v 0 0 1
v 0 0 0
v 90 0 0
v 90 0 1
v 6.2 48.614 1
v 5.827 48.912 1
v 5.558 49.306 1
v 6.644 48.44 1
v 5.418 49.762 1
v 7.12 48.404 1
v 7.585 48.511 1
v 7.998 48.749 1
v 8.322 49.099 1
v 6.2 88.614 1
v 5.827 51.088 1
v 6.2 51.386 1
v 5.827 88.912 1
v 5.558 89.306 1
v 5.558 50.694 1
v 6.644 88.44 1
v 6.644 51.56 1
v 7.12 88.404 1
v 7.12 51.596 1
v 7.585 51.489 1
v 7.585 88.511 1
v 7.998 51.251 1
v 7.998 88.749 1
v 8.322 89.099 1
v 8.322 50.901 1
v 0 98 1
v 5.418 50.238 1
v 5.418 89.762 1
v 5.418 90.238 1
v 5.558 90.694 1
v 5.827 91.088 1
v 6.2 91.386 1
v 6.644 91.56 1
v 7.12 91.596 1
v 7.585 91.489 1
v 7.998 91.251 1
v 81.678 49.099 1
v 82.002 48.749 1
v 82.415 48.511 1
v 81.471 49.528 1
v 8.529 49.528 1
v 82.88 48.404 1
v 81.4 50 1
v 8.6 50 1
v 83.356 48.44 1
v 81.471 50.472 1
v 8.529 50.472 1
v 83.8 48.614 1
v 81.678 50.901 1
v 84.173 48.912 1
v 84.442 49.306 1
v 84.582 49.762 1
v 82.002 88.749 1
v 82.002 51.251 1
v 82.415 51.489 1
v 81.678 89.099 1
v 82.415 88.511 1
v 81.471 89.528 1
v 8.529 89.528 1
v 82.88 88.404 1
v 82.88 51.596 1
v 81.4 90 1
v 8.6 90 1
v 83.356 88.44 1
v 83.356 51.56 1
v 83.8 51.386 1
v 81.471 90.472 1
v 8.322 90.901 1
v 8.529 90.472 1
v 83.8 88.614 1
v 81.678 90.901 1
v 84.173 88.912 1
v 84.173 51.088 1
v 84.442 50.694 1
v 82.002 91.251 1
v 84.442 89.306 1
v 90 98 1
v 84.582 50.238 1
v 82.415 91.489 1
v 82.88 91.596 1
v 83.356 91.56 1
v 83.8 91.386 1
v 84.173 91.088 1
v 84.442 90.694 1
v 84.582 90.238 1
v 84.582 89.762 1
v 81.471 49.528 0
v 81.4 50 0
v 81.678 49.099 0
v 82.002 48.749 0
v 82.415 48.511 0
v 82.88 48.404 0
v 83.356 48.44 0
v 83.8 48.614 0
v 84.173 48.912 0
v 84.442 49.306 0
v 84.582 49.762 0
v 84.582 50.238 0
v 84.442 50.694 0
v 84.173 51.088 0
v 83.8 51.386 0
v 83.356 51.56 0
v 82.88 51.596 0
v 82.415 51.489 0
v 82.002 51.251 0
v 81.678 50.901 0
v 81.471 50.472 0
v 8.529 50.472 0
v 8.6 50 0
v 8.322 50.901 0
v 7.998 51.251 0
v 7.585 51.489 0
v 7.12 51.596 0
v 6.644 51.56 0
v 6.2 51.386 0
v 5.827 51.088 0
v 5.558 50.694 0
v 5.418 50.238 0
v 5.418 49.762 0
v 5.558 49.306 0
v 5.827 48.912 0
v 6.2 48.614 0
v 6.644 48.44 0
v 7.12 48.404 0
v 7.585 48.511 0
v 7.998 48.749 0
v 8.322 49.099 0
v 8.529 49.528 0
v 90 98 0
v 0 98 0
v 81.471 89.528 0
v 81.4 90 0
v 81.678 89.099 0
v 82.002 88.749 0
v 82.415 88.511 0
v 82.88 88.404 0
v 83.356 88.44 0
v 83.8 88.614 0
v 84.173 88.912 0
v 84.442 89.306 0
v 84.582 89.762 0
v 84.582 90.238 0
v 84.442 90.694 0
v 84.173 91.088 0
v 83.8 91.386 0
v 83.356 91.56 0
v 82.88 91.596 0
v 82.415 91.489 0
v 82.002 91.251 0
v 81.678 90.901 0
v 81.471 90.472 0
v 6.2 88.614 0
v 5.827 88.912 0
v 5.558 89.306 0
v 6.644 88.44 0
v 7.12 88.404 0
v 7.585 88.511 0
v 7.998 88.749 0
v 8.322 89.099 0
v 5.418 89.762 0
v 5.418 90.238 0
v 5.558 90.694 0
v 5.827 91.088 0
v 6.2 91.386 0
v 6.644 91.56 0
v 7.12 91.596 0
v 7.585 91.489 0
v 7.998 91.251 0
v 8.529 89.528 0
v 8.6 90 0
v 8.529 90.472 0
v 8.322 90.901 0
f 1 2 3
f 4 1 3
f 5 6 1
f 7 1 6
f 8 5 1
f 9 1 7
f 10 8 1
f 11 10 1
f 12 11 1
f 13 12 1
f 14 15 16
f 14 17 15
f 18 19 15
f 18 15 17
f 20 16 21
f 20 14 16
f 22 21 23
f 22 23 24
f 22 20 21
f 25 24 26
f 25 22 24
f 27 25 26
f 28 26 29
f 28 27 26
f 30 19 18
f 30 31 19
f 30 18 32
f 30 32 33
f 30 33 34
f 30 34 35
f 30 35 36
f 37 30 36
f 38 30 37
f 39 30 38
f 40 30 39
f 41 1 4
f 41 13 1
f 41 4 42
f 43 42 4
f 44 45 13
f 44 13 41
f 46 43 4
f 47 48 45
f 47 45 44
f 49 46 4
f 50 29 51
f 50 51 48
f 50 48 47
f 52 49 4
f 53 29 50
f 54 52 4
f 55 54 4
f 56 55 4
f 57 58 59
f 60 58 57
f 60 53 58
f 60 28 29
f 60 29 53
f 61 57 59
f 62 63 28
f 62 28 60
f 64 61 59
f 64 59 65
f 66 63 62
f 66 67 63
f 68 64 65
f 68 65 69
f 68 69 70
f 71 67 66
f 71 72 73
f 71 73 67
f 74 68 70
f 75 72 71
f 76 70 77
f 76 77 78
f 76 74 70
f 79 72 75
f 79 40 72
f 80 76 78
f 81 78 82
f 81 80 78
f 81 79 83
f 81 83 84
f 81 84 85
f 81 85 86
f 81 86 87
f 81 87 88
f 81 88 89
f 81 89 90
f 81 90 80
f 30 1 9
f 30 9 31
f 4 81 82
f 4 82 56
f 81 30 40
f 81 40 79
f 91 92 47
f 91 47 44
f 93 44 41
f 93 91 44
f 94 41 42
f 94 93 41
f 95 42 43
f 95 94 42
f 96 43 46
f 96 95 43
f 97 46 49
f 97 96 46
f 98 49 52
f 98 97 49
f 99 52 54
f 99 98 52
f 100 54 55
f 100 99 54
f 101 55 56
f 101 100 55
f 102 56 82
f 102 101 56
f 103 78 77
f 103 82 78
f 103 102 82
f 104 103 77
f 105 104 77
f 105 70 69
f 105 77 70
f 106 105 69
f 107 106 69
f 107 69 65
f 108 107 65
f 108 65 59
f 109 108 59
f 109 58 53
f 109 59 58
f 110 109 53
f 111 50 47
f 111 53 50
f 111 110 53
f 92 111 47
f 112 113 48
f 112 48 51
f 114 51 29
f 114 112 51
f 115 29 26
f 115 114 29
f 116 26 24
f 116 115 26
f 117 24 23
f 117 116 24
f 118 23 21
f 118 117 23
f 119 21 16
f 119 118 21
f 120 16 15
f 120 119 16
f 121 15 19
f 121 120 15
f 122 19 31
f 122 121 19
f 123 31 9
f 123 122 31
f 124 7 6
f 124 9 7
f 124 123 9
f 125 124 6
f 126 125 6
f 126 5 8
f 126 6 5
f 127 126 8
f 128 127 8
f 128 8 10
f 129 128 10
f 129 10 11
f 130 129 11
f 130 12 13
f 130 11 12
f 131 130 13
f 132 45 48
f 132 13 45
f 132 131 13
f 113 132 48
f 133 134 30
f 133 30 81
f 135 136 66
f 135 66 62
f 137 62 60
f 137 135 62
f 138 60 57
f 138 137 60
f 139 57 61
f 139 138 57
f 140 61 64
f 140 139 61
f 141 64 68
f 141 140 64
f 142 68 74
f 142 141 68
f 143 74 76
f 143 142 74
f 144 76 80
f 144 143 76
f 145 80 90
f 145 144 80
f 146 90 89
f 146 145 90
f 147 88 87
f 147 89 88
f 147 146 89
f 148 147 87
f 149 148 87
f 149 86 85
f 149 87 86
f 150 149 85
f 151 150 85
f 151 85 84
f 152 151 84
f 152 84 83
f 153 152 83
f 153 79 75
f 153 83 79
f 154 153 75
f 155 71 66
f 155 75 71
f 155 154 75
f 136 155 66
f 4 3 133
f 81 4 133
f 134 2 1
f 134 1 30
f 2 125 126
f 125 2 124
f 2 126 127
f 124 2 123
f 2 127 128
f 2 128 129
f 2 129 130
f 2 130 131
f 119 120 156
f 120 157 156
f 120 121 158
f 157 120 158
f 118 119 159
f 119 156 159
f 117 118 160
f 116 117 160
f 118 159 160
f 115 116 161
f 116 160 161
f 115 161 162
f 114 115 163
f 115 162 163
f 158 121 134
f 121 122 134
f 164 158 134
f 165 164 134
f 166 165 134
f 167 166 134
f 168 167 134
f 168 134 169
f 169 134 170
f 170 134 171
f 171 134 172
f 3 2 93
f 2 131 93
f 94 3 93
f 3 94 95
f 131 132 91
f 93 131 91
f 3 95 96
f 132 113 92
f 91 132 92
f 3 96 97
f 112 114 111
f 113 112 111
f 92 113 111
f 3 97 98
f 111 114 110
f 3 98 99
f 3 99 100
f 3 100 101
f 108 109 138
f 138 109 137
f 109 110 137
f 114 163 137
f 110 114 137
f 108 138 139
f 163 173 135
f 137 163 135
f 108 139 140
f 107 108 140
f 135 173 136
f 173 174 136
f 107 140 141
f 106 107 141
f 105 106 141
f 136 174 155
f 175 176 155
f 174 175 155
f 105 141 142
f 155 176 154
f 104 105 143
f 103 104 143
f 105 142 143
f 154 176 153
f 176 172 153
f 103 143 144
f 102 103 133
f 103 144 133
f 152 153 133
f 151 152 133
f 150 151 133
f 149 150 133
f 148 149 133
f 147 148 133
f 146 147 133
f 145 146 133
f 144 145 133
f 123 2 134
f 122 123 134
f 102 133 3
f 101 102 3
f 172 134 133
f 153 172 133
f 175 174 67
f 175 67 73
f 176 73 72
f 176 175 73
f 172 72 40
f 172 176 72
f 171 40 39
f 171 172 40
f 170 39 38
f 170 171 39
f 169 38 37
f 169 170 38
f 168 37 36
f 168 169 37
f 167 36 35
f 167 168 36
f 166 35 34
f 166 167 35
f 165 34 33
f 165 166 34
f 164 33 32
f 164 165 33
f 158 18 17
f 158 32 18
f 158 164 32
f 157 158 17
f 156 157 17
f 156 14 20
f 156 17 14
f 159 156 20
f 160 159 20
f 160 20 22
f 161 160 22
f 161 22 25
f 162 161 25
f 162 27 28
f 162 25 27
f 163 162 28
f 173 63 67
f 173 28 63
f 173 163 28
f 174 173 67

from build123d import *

# Parameters (mm, degrees)
ESQUISSE1_W                  = 90
ESQUISSE1_H                  = 98
BOSS_EXTRU_1_DEPTH           = 1
ENL_V_MAT_EXTRU_1_DEPTH      = 134.06013678
ENL_V_MAT_EXTRU_1_DEPTH_BACK = 134.06013678
ESQUISSE2_R                  = 1.6


with BuildPart() as part:
    # Esquisse1 → Boss.-Extru.1 (new body)
    with BuildSketch(Plane.XY):
        with Locations((45, 49)):
            Rectangle(ESQUISSE1_W, ESQUISSE1_H)
    extrude(amount=BOSS_EXTRU_1_DEPTH)

    # Esquisse2 → Enlèv. mat.-Extru.1 (cut, two sides: drawn at the far end of the back side and taken through both)
    with BuildSketch(Plane.XY.offset(1).offset(-ENL_V_MAT_EXTRU_1_DEPTH_BACK)):
        with Locations((7, 50)):
            Circle(ESQUISSE2_R)
        with Locations((7, 90)):
            Circle(ESQUISSE2_R)
        with Locations(Location((83, 90, 0), (0, 0, 180))):
            Circle(ESQUISSE2_R)
        with Locations(Location((83, 50, 0), (0, 0, 180))):
            Circle(ESQUISSE2_R)
    extrude(amount=ENL_V_MAT_EXTRU_1_DEPTH + ENL_V_MAT_EXTRU_1_DEPTH_BACK, mode=Mode.SUBTRACT)


solid = part.part
